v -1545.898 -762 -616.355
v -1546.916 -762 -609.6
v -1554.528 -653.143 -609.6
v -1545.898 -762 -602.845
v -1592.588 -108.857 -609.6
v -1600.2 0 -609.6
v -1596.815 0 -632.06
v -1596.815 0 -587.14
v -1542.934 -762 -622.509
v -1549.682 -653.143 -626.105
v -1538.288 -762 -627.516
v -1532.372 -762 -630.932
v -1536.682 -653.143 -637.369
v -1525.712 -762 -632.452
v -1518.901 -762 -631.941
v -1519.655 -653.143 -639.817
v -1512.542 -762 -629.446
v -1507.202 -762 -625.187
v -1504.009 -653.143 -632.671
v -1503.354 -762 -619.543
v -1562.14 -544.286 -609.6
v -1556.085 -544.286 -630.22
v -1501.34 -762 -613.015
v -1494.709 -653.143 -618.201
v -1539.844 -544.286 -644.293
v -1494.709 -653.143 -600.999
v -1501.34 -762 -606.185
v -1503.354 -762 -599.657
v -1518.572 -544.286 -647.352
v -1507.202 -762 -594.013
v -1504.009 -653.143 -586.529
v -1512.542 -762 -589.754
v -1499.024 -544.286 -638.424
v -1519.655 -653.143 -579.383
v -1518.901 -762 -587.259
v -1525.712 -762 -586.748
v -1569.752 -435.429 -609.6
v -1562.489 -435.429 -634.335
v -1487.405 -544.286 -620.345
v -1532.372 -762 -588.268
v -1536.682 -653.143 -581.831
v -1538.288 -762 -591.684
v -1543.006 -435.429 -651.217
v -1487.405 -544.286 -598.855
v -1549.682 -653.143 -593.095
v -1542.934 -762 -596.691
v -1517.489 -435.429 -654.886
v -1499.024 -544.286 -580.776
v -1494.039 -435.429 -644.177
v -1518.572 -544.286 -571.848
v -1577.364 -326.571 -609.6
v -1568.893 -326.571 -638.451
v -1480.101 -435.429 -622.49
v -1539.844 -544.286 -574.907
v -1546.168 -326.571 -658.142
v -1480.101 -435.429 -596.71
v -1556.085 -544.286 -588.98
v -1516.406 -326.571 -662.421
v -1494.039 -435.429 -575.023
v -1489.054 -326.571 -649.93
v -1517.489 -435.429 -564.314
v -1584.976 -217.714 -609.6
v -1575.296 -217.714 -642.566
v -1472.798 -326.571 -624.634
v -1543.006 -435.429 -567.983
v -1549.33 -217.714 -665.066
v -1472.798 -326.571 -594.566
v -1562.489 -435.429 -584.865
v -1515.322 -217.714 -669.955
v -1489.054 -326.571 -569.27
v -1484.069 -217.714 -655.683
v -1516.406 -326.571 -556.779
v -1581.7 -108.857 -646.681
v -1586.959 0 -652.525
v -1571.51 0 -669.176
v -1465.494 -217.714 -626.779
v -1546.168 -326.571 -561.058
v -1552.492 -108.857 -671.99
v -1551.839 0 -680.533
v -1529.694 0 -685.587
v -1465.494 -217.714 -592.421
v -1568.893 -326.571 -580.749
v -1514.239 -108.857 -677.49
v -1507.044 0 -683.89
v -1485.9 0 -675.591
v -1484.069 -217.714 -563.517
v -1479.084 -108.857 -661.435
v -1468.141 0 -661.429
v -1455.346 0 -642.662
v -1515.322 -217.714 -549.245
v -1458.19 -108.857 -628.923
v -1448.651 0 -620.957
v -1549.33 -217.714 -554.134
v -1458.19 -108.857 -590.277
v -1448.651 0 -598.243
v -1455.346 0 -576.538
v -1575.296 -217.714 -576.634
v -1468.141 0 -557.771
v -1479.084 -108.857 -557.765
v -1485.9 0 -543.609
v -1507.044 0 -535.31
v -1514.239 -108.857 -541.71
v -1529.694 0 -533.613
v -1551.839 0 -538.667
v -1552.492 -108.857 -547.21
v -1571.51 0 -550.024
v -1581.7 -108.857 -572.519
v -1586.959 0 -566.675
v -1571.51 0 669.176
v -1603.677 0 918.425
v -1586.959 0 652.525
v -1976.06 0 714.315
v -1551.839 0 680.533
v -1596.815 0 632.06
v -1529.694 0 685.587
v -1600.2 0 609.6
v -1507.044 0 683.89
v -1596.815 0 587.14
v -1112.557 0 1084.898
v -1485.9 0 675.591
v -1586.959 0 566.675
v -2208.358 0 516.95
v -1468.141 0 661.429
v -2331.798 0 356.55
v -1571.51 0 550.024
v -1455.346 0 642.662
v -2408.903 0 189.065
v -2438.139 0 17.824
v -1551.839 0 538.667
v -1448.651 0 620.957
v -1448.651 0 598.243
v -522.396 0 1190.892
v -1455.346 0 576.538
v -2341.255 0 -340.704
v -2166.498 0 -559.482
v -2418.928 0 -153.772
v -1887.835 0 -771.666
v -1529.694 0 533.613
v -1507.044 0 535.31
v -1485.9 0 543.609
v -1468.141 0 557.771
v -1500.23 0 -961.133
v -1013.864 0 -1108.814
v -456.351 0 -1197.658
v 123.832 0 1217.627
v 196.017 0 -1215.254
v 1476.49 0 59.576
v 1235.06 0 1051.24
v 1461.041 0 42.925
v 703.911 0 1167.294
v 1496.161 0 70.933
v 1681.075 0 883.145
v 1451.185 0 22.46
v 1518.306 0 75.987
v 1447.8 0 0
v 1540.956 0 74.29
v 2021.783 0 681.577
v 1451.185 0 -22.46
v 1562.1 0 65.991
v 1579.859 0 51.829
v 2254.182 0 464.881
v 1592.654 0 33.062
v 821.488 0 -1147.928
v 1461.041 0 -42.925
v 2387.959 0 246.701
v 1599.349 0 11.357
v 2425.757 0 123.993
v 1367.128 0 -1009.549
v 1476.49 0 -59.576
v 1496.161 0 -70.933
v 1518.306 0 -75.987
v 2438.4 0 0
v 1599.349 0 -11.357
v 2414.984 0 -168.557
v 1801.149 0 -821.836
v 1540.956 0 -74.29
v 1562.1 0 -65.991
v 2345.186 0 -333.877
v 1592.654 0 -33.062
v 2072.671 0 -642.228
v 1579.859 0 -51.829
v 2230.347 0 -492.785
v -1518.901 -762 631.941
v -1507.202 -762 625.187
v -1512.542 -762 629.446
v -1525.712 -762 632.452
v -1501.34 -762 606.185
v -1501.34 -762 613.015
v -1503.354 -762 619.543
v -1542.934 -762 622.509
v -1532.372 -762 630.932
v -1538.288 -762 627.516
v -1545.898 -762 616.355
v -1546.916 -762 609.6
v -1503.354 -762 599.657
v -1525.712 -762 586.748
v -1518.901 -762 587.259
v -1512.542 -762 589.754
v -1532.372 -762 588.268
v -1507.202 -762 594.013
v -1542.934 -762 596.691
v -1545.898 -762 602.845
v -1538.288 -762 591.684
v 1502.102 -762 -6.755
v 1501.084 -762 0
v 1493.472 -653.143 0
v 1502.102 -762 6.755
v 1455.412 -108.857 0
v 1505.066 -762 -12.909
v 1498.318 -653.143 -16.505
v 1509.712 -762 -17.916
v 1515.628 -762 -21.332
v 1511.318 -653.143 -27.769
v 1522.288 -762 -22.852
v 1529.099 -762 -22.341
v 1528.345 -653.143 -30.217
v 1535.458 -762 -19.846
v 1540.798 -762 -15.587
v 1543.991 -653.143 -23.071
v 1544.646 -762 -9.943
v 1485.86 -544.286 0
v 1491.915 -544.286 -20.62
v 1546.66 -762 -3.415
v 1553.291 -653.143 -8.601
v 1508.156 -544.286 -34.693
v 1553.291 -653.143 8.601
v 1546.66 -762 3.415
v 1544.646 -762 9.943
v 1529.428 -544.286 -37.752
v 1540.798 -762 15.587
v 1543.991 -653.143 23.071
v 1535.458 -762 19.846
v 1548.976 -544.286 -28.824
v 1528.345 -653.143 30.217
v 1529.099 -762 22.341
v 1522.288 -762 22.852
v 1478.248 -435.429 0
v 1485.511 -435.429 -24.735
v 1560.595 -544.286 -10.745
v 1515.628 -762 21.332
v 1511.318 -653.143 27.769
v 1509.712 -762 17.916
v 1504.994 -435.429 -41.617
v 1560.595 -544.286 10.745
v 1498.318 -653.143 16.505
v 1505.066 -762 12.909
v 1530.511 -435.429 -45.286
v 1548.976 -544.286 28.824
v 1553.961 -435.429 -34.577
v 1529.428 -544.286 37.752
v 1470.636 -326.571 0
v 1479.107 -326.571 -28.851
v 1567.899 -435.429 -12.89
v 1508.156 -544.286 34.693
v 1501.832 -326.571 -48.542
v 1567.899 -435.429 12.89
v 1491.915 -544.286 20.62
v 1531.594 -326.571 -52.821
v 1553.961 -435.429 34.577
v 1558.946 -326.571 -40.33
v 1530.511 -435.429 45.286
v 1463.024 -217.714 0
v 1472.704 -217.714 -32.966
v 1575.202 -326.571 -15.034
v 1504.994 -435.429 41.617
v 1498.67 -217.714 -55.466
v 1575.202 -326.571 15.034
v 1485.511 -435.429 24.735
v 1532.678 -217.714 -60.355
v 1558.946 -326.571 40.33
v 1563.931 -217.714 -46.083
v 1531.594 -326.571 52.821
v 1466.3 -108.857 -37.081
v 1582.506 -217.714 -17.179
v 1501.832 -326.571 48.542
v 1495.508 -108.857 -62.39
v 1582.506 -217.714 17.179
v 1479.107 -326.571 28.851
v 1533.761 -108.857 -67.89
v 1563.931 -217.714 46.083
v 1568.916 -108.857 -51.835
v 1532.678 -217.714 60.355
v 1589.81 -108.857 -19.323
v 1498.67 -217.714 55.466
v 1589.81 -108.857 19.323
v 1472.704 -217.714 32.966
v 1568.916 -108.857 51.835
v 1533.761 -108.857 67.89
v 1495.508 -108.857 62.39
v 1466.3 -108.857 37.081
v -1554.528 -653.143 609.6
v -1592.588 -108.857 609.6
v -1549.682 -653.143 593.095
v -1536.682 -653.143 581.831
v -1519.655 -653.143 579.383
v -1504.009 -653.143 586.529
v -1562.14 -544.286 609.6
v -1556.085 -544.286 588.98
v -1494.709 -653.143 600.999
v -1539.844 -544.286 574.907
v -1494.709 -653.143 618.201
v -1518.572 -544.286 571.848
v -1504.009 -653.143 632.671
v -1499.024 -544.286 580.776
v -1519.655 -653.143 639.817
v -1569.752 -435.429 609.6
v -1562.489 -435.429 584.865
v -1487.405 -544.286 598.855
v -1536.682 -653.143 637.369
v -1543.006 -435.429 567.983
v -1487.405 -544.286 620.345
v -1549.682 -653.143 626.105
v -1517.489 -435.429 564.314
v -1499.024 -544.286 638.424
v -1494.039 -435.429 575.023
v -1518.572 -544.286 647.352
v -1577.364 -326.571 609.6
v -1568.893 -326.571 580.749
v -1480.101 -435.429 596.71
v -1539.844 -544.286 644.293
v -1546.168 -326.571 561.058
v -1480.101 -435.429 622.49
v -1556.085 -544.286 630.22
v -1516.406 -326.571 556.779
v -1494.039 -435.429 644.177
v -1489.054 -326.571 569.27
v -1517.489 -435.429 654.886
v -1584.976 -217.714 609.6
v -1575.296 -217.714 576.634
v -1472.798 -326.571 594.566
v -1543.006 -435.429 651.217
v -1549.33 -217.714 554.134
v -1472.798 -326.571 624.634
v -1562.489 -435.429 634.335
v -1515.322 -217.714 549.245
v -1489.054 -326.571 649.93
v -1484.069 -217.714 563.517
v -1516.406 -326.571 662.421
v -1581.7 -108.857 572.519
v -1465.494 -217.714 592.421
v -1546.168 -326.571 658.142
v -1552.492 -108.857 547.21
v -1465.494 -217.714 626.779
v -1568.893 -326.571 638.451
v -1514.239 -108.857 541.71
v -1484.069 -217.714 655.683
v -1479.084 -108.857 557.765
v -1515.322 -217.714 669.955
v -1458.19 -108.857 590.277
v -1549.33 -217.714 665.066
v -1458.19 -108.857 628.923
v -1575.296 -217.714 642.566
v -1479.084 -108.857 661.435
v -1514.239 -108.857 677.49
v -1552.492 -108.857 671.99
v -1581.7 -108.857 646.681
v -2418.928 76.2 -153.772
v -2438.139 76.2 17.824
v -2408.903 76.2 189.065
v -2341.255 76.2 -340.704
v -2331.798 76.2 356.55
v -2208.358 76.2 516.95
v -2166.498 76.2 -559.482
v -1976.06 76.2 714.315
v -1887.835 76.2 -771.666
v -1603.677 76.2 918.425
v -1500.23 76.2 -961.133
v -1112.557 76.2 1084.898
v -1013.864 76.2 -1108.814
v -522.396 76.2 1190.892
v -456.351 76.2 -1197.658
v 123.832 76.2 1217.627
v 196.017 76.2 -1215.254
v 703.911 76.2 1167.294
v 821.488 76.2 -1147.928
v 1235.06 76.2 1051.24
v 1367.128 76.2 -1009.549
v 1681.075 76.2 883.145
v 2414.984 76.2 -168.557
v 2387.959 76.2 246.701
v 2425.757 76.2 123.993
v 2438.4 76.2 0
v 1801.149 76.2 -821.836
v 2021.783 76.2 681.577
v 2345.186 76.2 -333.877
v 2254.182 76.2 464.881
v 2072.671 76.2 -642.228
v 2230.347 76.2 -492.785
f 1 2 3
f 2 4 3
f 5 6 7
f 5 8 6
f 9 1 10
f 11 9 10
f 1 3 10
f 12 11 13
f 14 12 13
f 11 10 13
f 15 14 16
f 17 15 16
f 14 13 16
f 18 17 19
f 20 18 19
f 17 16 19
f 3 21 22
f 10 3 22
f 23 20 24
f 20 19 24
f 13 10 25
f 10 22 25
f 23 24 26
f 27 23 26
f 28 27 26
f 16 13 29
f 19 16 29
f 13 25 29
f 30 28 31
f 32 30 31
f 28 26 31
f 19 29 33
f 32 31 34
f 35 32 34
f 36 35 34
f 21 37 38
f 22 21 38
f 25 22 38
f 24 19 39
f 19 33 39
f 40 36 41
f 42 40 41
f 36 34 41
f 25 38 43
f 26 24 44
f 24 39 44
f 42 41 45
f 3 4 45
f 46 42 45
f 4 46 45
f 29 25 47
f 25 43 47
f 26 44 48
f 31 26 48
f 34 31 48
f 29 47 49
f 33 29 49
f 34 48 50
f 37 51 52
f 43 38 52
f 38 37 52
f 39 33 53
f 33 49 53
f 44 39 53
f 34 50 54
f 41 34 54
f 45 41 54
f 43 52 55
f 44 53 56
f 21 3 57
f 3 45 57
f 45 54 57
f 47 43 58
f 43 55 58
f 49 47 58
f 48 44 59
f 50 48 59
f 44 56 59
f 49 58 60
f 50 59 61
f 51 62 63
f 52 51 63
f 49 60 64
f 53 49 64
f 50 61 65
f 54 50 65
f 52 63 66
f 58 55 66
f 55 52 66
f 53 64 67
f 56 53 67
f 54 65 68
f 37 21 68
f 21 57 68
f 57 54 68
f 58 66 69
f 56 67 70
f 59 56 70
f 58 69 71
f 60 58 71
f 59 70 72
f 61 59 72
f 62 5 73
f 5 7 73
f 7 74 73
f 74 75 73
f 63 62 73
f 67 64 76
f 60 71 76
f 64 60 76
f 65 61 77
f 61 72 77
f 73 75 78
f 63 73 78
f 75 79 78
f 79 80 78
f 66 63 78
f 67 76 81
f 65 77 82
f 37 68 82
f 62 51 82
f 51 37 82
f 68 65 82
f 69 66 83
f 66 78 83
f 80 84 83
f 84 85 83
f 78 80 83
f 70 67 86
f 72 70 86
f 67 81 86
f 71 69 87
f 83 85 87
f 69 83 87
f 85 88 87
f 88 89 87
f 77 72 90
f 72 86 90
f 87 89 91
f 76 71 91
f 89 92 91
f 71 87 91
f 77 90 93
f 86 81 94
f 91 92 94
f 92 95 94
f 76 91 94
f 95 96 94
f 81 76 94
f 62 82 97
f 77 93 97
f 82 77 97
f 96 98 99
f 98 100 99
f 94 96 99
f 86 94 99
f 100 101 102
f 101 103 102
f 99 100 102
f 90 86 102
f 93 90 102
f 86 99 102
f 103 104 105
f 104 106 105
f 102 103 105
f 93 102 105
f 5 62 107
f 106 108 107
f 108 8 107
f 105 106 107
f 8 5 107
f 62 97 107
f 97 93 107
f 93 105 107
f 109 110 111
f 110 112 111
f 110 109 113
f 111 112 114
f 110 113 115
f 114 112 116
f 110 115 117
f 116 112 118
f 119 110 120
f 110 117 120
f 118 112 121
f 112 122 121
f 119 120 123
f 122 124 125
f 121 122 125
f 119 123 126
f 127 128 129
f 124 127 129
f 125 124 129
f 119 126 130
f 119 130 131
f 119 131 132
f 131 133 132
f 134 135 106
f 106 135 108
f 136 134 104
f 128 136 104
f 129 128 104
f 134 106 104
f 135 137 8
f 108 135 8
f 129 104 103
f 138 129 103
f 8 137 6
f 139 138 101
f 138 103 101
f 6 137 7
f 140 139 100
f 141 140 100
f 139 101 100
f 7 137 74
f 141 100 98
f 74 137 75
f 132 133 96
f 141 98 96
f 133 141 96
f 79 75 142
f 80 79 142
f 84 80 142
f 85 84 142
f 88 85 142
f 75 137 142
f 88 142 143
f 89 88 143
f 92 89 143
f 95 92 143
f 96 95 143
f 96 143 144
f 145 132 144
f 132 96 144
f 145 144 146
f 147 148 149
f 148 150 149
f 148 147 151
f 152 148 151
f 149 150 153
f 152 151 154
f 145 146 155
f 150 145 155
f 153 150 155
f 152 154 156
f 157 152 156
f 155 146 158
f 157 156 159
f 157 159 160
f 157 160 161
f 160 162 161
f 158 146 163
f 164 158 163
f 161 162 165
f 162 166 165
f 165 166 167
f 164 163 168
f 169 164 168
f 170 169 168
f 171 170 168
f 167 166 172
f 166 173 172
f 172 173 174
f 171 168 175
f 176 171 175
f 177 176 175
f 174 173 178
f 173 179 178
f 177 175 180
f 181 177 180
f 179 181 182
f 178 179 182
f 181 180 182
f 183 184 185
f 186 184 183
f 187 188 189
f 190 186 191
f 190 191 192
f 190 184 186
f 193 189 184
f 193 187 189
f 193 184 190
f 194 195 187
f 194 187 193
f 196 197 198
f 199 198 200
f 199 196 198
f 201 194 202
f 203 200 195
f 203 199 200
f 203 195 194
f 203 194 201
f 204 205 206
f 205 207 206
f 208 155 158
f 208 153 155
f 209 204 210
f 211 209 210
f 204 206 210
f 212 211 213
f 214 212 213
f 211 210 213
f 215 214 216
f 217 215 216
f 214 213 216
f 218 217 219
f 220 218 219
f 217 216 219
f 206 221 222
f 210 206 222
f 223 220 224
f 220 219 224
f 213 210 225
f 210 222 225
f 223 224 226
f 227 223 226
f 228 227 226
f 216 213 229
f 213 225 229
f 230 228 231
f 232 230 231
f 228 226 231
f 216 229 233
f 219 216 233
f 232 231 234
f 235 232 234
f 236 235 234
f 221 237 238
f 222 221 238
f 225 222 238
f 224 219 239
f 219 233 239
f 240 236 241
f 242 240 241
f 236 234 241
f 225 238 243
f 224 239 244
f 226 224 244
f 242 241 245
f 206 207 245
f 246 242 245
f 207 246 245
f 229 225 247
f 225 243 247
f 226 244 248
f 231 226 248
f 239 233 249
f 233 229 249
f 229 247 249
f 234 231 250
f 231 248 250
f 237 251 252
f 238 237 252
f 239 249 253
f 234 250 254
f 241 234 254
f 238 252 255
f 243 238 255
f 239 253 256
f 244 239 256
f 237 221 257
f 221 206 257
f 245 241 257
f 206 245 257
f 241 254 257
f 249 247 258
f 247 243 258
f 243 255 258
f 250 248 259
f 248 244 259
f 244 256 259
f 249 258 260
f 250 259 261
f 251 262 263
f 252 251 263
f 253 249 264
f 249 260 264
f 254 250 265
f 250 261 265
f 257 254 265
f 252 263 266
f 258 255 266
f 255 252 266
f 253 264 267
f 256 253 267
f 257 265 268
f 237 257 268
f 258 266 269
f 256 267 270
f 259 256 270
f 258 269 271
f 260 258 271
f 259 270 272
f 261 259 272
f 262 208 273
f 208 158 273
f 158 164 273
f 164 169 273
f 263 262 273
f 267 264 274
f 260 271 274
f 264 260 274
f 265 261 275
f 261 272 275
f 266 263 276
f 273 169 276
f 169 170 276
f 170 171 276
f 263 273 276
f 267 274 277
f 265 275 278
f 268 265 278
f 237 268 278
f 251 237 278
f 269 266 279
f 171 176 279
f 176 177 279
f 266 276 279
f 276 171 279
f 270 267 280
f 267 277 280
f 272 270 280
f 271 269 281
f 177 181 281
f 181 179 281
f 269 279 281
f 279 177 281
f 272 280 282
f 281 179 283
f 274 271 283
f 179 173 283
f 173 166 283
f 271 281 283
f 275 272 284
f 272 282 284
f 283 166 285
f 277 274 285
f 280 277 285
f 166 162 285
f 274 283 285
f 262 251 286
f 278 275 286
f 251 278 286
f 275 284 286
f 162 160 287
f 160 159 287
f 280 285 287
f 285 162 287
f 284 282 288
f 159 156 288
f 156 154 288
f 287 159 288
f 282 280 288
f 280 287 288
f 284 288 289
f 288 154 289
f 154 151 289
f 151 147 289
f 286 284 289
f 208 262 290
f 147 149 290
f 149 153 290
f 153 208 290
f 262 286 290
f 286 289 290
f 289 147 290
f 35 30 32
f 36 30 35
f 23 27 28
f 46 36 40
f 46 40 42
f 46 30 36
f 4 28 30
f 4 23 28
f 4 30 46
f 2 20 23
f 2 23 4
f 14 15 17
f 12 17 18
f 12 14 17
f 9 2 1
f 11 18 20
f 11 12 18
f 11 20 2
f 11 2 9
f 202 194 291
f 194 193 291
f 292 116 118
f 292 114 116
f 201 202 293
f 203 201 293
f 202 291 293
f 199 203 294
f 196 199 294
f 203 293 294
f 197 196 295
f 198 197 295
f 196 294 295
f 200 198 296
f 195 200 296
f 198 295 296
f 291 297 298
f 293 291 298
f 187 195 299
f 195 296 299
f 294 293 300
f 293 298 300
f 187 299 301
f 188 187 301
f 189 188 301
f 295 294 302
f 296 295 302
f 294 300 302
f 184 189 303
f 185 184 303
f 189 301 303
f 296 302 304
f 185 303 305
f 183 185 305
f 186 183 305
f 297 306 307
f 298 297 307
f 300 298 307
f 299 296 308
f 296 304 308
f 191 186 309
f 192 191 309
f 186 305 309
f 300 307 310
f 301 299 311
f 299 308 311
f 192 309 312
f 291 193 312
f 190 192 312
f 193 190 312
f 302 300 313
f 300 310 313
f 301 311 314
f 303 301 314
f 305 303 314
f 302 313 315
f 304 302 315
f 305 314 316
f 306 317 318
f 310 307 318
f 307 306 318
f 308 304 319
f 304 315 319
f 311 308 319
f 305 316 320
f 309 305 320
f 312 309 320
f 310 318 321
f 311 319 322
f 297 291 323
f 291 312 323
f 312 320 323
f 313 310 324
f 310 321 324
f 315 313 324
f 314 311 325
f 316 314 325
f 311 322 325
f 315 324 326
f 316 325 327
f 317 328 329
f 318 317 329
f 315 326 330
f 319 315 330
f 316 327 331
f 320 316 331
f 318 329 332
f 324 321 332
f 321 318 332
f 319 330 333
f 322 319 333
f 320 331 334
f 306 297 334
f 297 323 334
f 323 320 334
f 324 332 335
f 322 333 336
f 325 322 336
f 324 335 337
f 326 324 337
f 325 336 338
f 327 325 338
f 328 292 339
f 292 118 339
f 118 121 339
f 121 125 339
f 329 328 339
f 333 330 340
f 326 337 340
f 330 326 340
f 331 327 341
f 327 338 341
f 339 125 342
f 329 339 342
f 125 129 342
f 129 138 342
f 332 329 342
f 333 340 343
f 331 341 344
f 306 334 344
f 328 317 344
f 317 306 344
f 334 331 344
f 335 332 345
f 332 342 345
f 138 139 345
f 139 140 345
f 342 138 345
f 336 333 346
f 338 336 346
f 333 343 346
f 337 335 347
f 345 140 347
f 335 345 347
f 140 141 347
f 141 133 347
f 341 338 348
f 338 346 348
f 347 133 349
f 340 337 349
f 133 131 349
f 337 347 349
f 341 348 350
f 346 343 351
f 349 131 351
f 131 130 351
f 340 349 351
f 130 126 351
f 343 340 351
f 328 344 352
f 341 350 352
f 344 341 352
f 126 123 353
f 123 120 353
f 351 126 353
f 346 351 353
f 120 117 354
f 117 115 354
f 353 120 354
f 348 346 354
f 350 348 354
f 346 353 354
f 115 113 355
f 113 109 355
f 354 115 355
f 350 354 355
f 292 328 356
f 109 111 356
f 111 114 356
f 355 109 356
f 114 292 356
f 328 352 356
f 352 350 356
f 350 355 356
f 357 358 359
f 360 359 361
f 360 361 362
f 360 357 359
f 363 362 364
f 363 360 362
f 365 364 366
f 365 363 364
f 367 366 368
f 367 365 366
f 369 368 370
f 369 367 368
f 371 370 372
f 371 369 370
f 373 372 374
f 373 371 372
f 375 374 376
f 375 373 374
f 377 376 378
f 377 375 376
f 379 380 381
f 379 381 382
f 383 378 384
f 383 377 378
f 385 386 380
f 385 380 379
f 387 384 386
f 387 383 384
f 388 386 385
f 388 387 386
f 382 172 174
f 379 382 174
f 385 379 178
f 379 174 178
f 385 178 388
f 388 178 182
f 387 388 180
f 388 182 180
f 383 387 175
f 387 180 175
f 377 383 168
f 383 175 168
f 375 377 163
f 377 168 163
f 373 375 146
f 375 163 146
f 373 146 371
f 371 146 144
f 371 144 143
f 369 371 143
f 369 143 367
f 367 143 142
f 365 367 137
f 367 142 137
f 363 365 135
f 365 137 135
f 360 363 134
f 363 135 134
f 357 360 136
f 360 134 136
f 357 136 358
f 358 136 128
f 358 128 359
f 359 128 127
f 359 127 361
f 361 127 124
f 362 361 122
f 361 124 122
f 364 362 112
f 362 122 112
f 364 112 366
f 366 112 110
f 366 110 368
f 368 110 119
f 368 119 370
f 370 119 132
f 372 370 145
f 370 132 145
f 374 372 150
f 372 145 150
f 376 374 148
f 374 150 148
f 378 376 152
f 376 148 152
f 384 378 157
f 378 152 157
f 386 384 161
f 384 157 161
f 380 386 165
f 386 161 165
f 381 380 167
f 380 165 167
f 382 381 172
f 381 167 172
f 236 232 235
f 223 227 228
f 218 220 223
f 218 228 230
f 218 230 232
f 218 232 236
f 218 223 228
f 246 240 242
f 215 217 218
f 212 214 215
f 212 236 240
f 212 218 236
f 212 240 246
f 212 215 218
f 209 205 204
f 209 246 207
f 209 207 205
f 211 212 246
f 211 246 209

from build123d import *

# Parameters (mm, degrees)
SKETCH2_RX                    = 2438.4
SKETCH2_RY                    = 1219.2
BOSS_EXTRUDE2_DEPTH           = 76.2
SKETCH3_R                     = 76.2
BOSS_EXTRUDE3_DEPTH           = 762
BOSS_EXTRUDE3_DRAFT           = 4
BOSS_EXTRUDE3_PROFILE_2_DEPTH = 762
BOSS_EXTRUDE3_PROFILE_2_DRAFT = 4
BOSS_EXTRUDE3_PROFILE_3_DEPTH = 762
BOSS_EXTRUDE3_PROFILE_3_DRAFT = 4


with BuildPart() as part:
    # Sketch2 → Boss-Extrude2 (new body)
    with BuildSketch(Plane(origin=(0, 0, 0), x_dir=(1, 0, 0), z_dir=(0, 1, 0))):
        with Locations((0, 0)):
            Ellipse(SKETCH2_RX, SKETCH2_RY)
    extrude(amount=BOSS_EXTRUDE2_DEPTH)


with BuildPart() as boss_extrude3_tool:
    # Sketch3 → Boss-Extrude3 (with draft: the straight prism first)
    with BuildSketch(Plane(origin=(0, 0, 0), x_dir=(-1, 0, 0), z_dir=(0, -1, 0))):
        with Locations((1524, -609.6)):
            Circle(SKETCH3_R)
    extrude(amount=BOSS_EXTRUDE3_DEPTH)
    # Boss-Extrude3: the draft: its side faces are tilted about the plane it starts from
    boss_extrude3_sides = [boss_extrude3_tool.faces().sort_by_distance(p)[0] for p in [
        (-1447.8, -381, 609.6),
    ]]
    draft(boss_extrude3_sides, Plane(origin=(0, 0, 0), x_dir=(-1, 0, 0), z_dir=(0, -1, 0)), BOSS_EXTRUDE3_DRAFT)


with BuildPart() as part_1:
    add(part.part)

    # Boss-Extrude3: add boss_extrude3_tool
    add(boss_extrude3_tool.part)


with BuildPart() as boss_extrude3_profile_2_tool:
    # Sketch3 → Boss-Extrude3 profile 2 (with draft: the straight prism first)
    with BuildSketch(Plane(origin=(0, 0, 0), x_dir=(-1, 0, 0), z_dir=(0, -1, 0))):
        with Locations((1524, 609.6)):
            Circle(SKETCH3_R)
    extrude(amount=BOSS_EXTRUDE3_PROFILE_2_DEPTH)
    # Boss-Extrude3 profile 2: the draft: its side faces are tilted about the plane it starts from
    boss_extrude3_profile_2_sides = [boss_extrude3_profile_2_tool.faces().sort_by_distance(p)[0] for p in [
        (-1447.8, -381, -609.6),
    ]]
    draft(boss_extrude3_profile_2_sides, Plane(origin=(0, 0, 0), x_dir=(-1, 0, 0), z_dir=(0, -1, 0)), BOSS_EXTRUDE3_PROFILE_2_DRAFT)


with BuildPart() as part_2:
    add(part_1.part)

    # Boss-Extrude3 profile 2: add boss_extrude3_profile_2_tool
    add(boss_extrude3_profile_2_tool.part)


with BuildPart() as boss_extrude3_profile_3_tool:
    # Sketch3 → Boss-Extrude3 profile 3 (with draft: the straight prism first)
    with BuildSketch(Plane(origin=(0, 0, 0), x_dir=(-1, 0, 0), z_dir=(0, -1, 0))):
        with Locations((-1524, 0)):
            Circle(SKETCH3_R)
    extrude(amount=BOSS_EXTRUDE3_PROFILE_3_DEPTH)
    # Boss-Extrude3 profile 3: the draft: its side faces are tilted about the plane it starts from
    boss_extrude3_profile_3_sides = [boss_extrude3_profile_3_tool.faces().sort_by_distance(p)[0] for p in [
        (1600.2, -381, 0),
    ]]
    draft(boss_extrude3_profile_3_sides, Plane(origin=(0, 0, 0), x_dir=(-1, 0, 0), z_dir=(0, -1, 0)), BOSS_EXTRUDE3_PROFILE_3_DRAFT)


with BuildPart() as part_3:
    add(part_2.part)

    # Boss-Extrude3 profile 3: add boss_extrude3_profile_3_tool
    add(boss_extrude3_profile_3_tool.part)


solid = part_3.part
